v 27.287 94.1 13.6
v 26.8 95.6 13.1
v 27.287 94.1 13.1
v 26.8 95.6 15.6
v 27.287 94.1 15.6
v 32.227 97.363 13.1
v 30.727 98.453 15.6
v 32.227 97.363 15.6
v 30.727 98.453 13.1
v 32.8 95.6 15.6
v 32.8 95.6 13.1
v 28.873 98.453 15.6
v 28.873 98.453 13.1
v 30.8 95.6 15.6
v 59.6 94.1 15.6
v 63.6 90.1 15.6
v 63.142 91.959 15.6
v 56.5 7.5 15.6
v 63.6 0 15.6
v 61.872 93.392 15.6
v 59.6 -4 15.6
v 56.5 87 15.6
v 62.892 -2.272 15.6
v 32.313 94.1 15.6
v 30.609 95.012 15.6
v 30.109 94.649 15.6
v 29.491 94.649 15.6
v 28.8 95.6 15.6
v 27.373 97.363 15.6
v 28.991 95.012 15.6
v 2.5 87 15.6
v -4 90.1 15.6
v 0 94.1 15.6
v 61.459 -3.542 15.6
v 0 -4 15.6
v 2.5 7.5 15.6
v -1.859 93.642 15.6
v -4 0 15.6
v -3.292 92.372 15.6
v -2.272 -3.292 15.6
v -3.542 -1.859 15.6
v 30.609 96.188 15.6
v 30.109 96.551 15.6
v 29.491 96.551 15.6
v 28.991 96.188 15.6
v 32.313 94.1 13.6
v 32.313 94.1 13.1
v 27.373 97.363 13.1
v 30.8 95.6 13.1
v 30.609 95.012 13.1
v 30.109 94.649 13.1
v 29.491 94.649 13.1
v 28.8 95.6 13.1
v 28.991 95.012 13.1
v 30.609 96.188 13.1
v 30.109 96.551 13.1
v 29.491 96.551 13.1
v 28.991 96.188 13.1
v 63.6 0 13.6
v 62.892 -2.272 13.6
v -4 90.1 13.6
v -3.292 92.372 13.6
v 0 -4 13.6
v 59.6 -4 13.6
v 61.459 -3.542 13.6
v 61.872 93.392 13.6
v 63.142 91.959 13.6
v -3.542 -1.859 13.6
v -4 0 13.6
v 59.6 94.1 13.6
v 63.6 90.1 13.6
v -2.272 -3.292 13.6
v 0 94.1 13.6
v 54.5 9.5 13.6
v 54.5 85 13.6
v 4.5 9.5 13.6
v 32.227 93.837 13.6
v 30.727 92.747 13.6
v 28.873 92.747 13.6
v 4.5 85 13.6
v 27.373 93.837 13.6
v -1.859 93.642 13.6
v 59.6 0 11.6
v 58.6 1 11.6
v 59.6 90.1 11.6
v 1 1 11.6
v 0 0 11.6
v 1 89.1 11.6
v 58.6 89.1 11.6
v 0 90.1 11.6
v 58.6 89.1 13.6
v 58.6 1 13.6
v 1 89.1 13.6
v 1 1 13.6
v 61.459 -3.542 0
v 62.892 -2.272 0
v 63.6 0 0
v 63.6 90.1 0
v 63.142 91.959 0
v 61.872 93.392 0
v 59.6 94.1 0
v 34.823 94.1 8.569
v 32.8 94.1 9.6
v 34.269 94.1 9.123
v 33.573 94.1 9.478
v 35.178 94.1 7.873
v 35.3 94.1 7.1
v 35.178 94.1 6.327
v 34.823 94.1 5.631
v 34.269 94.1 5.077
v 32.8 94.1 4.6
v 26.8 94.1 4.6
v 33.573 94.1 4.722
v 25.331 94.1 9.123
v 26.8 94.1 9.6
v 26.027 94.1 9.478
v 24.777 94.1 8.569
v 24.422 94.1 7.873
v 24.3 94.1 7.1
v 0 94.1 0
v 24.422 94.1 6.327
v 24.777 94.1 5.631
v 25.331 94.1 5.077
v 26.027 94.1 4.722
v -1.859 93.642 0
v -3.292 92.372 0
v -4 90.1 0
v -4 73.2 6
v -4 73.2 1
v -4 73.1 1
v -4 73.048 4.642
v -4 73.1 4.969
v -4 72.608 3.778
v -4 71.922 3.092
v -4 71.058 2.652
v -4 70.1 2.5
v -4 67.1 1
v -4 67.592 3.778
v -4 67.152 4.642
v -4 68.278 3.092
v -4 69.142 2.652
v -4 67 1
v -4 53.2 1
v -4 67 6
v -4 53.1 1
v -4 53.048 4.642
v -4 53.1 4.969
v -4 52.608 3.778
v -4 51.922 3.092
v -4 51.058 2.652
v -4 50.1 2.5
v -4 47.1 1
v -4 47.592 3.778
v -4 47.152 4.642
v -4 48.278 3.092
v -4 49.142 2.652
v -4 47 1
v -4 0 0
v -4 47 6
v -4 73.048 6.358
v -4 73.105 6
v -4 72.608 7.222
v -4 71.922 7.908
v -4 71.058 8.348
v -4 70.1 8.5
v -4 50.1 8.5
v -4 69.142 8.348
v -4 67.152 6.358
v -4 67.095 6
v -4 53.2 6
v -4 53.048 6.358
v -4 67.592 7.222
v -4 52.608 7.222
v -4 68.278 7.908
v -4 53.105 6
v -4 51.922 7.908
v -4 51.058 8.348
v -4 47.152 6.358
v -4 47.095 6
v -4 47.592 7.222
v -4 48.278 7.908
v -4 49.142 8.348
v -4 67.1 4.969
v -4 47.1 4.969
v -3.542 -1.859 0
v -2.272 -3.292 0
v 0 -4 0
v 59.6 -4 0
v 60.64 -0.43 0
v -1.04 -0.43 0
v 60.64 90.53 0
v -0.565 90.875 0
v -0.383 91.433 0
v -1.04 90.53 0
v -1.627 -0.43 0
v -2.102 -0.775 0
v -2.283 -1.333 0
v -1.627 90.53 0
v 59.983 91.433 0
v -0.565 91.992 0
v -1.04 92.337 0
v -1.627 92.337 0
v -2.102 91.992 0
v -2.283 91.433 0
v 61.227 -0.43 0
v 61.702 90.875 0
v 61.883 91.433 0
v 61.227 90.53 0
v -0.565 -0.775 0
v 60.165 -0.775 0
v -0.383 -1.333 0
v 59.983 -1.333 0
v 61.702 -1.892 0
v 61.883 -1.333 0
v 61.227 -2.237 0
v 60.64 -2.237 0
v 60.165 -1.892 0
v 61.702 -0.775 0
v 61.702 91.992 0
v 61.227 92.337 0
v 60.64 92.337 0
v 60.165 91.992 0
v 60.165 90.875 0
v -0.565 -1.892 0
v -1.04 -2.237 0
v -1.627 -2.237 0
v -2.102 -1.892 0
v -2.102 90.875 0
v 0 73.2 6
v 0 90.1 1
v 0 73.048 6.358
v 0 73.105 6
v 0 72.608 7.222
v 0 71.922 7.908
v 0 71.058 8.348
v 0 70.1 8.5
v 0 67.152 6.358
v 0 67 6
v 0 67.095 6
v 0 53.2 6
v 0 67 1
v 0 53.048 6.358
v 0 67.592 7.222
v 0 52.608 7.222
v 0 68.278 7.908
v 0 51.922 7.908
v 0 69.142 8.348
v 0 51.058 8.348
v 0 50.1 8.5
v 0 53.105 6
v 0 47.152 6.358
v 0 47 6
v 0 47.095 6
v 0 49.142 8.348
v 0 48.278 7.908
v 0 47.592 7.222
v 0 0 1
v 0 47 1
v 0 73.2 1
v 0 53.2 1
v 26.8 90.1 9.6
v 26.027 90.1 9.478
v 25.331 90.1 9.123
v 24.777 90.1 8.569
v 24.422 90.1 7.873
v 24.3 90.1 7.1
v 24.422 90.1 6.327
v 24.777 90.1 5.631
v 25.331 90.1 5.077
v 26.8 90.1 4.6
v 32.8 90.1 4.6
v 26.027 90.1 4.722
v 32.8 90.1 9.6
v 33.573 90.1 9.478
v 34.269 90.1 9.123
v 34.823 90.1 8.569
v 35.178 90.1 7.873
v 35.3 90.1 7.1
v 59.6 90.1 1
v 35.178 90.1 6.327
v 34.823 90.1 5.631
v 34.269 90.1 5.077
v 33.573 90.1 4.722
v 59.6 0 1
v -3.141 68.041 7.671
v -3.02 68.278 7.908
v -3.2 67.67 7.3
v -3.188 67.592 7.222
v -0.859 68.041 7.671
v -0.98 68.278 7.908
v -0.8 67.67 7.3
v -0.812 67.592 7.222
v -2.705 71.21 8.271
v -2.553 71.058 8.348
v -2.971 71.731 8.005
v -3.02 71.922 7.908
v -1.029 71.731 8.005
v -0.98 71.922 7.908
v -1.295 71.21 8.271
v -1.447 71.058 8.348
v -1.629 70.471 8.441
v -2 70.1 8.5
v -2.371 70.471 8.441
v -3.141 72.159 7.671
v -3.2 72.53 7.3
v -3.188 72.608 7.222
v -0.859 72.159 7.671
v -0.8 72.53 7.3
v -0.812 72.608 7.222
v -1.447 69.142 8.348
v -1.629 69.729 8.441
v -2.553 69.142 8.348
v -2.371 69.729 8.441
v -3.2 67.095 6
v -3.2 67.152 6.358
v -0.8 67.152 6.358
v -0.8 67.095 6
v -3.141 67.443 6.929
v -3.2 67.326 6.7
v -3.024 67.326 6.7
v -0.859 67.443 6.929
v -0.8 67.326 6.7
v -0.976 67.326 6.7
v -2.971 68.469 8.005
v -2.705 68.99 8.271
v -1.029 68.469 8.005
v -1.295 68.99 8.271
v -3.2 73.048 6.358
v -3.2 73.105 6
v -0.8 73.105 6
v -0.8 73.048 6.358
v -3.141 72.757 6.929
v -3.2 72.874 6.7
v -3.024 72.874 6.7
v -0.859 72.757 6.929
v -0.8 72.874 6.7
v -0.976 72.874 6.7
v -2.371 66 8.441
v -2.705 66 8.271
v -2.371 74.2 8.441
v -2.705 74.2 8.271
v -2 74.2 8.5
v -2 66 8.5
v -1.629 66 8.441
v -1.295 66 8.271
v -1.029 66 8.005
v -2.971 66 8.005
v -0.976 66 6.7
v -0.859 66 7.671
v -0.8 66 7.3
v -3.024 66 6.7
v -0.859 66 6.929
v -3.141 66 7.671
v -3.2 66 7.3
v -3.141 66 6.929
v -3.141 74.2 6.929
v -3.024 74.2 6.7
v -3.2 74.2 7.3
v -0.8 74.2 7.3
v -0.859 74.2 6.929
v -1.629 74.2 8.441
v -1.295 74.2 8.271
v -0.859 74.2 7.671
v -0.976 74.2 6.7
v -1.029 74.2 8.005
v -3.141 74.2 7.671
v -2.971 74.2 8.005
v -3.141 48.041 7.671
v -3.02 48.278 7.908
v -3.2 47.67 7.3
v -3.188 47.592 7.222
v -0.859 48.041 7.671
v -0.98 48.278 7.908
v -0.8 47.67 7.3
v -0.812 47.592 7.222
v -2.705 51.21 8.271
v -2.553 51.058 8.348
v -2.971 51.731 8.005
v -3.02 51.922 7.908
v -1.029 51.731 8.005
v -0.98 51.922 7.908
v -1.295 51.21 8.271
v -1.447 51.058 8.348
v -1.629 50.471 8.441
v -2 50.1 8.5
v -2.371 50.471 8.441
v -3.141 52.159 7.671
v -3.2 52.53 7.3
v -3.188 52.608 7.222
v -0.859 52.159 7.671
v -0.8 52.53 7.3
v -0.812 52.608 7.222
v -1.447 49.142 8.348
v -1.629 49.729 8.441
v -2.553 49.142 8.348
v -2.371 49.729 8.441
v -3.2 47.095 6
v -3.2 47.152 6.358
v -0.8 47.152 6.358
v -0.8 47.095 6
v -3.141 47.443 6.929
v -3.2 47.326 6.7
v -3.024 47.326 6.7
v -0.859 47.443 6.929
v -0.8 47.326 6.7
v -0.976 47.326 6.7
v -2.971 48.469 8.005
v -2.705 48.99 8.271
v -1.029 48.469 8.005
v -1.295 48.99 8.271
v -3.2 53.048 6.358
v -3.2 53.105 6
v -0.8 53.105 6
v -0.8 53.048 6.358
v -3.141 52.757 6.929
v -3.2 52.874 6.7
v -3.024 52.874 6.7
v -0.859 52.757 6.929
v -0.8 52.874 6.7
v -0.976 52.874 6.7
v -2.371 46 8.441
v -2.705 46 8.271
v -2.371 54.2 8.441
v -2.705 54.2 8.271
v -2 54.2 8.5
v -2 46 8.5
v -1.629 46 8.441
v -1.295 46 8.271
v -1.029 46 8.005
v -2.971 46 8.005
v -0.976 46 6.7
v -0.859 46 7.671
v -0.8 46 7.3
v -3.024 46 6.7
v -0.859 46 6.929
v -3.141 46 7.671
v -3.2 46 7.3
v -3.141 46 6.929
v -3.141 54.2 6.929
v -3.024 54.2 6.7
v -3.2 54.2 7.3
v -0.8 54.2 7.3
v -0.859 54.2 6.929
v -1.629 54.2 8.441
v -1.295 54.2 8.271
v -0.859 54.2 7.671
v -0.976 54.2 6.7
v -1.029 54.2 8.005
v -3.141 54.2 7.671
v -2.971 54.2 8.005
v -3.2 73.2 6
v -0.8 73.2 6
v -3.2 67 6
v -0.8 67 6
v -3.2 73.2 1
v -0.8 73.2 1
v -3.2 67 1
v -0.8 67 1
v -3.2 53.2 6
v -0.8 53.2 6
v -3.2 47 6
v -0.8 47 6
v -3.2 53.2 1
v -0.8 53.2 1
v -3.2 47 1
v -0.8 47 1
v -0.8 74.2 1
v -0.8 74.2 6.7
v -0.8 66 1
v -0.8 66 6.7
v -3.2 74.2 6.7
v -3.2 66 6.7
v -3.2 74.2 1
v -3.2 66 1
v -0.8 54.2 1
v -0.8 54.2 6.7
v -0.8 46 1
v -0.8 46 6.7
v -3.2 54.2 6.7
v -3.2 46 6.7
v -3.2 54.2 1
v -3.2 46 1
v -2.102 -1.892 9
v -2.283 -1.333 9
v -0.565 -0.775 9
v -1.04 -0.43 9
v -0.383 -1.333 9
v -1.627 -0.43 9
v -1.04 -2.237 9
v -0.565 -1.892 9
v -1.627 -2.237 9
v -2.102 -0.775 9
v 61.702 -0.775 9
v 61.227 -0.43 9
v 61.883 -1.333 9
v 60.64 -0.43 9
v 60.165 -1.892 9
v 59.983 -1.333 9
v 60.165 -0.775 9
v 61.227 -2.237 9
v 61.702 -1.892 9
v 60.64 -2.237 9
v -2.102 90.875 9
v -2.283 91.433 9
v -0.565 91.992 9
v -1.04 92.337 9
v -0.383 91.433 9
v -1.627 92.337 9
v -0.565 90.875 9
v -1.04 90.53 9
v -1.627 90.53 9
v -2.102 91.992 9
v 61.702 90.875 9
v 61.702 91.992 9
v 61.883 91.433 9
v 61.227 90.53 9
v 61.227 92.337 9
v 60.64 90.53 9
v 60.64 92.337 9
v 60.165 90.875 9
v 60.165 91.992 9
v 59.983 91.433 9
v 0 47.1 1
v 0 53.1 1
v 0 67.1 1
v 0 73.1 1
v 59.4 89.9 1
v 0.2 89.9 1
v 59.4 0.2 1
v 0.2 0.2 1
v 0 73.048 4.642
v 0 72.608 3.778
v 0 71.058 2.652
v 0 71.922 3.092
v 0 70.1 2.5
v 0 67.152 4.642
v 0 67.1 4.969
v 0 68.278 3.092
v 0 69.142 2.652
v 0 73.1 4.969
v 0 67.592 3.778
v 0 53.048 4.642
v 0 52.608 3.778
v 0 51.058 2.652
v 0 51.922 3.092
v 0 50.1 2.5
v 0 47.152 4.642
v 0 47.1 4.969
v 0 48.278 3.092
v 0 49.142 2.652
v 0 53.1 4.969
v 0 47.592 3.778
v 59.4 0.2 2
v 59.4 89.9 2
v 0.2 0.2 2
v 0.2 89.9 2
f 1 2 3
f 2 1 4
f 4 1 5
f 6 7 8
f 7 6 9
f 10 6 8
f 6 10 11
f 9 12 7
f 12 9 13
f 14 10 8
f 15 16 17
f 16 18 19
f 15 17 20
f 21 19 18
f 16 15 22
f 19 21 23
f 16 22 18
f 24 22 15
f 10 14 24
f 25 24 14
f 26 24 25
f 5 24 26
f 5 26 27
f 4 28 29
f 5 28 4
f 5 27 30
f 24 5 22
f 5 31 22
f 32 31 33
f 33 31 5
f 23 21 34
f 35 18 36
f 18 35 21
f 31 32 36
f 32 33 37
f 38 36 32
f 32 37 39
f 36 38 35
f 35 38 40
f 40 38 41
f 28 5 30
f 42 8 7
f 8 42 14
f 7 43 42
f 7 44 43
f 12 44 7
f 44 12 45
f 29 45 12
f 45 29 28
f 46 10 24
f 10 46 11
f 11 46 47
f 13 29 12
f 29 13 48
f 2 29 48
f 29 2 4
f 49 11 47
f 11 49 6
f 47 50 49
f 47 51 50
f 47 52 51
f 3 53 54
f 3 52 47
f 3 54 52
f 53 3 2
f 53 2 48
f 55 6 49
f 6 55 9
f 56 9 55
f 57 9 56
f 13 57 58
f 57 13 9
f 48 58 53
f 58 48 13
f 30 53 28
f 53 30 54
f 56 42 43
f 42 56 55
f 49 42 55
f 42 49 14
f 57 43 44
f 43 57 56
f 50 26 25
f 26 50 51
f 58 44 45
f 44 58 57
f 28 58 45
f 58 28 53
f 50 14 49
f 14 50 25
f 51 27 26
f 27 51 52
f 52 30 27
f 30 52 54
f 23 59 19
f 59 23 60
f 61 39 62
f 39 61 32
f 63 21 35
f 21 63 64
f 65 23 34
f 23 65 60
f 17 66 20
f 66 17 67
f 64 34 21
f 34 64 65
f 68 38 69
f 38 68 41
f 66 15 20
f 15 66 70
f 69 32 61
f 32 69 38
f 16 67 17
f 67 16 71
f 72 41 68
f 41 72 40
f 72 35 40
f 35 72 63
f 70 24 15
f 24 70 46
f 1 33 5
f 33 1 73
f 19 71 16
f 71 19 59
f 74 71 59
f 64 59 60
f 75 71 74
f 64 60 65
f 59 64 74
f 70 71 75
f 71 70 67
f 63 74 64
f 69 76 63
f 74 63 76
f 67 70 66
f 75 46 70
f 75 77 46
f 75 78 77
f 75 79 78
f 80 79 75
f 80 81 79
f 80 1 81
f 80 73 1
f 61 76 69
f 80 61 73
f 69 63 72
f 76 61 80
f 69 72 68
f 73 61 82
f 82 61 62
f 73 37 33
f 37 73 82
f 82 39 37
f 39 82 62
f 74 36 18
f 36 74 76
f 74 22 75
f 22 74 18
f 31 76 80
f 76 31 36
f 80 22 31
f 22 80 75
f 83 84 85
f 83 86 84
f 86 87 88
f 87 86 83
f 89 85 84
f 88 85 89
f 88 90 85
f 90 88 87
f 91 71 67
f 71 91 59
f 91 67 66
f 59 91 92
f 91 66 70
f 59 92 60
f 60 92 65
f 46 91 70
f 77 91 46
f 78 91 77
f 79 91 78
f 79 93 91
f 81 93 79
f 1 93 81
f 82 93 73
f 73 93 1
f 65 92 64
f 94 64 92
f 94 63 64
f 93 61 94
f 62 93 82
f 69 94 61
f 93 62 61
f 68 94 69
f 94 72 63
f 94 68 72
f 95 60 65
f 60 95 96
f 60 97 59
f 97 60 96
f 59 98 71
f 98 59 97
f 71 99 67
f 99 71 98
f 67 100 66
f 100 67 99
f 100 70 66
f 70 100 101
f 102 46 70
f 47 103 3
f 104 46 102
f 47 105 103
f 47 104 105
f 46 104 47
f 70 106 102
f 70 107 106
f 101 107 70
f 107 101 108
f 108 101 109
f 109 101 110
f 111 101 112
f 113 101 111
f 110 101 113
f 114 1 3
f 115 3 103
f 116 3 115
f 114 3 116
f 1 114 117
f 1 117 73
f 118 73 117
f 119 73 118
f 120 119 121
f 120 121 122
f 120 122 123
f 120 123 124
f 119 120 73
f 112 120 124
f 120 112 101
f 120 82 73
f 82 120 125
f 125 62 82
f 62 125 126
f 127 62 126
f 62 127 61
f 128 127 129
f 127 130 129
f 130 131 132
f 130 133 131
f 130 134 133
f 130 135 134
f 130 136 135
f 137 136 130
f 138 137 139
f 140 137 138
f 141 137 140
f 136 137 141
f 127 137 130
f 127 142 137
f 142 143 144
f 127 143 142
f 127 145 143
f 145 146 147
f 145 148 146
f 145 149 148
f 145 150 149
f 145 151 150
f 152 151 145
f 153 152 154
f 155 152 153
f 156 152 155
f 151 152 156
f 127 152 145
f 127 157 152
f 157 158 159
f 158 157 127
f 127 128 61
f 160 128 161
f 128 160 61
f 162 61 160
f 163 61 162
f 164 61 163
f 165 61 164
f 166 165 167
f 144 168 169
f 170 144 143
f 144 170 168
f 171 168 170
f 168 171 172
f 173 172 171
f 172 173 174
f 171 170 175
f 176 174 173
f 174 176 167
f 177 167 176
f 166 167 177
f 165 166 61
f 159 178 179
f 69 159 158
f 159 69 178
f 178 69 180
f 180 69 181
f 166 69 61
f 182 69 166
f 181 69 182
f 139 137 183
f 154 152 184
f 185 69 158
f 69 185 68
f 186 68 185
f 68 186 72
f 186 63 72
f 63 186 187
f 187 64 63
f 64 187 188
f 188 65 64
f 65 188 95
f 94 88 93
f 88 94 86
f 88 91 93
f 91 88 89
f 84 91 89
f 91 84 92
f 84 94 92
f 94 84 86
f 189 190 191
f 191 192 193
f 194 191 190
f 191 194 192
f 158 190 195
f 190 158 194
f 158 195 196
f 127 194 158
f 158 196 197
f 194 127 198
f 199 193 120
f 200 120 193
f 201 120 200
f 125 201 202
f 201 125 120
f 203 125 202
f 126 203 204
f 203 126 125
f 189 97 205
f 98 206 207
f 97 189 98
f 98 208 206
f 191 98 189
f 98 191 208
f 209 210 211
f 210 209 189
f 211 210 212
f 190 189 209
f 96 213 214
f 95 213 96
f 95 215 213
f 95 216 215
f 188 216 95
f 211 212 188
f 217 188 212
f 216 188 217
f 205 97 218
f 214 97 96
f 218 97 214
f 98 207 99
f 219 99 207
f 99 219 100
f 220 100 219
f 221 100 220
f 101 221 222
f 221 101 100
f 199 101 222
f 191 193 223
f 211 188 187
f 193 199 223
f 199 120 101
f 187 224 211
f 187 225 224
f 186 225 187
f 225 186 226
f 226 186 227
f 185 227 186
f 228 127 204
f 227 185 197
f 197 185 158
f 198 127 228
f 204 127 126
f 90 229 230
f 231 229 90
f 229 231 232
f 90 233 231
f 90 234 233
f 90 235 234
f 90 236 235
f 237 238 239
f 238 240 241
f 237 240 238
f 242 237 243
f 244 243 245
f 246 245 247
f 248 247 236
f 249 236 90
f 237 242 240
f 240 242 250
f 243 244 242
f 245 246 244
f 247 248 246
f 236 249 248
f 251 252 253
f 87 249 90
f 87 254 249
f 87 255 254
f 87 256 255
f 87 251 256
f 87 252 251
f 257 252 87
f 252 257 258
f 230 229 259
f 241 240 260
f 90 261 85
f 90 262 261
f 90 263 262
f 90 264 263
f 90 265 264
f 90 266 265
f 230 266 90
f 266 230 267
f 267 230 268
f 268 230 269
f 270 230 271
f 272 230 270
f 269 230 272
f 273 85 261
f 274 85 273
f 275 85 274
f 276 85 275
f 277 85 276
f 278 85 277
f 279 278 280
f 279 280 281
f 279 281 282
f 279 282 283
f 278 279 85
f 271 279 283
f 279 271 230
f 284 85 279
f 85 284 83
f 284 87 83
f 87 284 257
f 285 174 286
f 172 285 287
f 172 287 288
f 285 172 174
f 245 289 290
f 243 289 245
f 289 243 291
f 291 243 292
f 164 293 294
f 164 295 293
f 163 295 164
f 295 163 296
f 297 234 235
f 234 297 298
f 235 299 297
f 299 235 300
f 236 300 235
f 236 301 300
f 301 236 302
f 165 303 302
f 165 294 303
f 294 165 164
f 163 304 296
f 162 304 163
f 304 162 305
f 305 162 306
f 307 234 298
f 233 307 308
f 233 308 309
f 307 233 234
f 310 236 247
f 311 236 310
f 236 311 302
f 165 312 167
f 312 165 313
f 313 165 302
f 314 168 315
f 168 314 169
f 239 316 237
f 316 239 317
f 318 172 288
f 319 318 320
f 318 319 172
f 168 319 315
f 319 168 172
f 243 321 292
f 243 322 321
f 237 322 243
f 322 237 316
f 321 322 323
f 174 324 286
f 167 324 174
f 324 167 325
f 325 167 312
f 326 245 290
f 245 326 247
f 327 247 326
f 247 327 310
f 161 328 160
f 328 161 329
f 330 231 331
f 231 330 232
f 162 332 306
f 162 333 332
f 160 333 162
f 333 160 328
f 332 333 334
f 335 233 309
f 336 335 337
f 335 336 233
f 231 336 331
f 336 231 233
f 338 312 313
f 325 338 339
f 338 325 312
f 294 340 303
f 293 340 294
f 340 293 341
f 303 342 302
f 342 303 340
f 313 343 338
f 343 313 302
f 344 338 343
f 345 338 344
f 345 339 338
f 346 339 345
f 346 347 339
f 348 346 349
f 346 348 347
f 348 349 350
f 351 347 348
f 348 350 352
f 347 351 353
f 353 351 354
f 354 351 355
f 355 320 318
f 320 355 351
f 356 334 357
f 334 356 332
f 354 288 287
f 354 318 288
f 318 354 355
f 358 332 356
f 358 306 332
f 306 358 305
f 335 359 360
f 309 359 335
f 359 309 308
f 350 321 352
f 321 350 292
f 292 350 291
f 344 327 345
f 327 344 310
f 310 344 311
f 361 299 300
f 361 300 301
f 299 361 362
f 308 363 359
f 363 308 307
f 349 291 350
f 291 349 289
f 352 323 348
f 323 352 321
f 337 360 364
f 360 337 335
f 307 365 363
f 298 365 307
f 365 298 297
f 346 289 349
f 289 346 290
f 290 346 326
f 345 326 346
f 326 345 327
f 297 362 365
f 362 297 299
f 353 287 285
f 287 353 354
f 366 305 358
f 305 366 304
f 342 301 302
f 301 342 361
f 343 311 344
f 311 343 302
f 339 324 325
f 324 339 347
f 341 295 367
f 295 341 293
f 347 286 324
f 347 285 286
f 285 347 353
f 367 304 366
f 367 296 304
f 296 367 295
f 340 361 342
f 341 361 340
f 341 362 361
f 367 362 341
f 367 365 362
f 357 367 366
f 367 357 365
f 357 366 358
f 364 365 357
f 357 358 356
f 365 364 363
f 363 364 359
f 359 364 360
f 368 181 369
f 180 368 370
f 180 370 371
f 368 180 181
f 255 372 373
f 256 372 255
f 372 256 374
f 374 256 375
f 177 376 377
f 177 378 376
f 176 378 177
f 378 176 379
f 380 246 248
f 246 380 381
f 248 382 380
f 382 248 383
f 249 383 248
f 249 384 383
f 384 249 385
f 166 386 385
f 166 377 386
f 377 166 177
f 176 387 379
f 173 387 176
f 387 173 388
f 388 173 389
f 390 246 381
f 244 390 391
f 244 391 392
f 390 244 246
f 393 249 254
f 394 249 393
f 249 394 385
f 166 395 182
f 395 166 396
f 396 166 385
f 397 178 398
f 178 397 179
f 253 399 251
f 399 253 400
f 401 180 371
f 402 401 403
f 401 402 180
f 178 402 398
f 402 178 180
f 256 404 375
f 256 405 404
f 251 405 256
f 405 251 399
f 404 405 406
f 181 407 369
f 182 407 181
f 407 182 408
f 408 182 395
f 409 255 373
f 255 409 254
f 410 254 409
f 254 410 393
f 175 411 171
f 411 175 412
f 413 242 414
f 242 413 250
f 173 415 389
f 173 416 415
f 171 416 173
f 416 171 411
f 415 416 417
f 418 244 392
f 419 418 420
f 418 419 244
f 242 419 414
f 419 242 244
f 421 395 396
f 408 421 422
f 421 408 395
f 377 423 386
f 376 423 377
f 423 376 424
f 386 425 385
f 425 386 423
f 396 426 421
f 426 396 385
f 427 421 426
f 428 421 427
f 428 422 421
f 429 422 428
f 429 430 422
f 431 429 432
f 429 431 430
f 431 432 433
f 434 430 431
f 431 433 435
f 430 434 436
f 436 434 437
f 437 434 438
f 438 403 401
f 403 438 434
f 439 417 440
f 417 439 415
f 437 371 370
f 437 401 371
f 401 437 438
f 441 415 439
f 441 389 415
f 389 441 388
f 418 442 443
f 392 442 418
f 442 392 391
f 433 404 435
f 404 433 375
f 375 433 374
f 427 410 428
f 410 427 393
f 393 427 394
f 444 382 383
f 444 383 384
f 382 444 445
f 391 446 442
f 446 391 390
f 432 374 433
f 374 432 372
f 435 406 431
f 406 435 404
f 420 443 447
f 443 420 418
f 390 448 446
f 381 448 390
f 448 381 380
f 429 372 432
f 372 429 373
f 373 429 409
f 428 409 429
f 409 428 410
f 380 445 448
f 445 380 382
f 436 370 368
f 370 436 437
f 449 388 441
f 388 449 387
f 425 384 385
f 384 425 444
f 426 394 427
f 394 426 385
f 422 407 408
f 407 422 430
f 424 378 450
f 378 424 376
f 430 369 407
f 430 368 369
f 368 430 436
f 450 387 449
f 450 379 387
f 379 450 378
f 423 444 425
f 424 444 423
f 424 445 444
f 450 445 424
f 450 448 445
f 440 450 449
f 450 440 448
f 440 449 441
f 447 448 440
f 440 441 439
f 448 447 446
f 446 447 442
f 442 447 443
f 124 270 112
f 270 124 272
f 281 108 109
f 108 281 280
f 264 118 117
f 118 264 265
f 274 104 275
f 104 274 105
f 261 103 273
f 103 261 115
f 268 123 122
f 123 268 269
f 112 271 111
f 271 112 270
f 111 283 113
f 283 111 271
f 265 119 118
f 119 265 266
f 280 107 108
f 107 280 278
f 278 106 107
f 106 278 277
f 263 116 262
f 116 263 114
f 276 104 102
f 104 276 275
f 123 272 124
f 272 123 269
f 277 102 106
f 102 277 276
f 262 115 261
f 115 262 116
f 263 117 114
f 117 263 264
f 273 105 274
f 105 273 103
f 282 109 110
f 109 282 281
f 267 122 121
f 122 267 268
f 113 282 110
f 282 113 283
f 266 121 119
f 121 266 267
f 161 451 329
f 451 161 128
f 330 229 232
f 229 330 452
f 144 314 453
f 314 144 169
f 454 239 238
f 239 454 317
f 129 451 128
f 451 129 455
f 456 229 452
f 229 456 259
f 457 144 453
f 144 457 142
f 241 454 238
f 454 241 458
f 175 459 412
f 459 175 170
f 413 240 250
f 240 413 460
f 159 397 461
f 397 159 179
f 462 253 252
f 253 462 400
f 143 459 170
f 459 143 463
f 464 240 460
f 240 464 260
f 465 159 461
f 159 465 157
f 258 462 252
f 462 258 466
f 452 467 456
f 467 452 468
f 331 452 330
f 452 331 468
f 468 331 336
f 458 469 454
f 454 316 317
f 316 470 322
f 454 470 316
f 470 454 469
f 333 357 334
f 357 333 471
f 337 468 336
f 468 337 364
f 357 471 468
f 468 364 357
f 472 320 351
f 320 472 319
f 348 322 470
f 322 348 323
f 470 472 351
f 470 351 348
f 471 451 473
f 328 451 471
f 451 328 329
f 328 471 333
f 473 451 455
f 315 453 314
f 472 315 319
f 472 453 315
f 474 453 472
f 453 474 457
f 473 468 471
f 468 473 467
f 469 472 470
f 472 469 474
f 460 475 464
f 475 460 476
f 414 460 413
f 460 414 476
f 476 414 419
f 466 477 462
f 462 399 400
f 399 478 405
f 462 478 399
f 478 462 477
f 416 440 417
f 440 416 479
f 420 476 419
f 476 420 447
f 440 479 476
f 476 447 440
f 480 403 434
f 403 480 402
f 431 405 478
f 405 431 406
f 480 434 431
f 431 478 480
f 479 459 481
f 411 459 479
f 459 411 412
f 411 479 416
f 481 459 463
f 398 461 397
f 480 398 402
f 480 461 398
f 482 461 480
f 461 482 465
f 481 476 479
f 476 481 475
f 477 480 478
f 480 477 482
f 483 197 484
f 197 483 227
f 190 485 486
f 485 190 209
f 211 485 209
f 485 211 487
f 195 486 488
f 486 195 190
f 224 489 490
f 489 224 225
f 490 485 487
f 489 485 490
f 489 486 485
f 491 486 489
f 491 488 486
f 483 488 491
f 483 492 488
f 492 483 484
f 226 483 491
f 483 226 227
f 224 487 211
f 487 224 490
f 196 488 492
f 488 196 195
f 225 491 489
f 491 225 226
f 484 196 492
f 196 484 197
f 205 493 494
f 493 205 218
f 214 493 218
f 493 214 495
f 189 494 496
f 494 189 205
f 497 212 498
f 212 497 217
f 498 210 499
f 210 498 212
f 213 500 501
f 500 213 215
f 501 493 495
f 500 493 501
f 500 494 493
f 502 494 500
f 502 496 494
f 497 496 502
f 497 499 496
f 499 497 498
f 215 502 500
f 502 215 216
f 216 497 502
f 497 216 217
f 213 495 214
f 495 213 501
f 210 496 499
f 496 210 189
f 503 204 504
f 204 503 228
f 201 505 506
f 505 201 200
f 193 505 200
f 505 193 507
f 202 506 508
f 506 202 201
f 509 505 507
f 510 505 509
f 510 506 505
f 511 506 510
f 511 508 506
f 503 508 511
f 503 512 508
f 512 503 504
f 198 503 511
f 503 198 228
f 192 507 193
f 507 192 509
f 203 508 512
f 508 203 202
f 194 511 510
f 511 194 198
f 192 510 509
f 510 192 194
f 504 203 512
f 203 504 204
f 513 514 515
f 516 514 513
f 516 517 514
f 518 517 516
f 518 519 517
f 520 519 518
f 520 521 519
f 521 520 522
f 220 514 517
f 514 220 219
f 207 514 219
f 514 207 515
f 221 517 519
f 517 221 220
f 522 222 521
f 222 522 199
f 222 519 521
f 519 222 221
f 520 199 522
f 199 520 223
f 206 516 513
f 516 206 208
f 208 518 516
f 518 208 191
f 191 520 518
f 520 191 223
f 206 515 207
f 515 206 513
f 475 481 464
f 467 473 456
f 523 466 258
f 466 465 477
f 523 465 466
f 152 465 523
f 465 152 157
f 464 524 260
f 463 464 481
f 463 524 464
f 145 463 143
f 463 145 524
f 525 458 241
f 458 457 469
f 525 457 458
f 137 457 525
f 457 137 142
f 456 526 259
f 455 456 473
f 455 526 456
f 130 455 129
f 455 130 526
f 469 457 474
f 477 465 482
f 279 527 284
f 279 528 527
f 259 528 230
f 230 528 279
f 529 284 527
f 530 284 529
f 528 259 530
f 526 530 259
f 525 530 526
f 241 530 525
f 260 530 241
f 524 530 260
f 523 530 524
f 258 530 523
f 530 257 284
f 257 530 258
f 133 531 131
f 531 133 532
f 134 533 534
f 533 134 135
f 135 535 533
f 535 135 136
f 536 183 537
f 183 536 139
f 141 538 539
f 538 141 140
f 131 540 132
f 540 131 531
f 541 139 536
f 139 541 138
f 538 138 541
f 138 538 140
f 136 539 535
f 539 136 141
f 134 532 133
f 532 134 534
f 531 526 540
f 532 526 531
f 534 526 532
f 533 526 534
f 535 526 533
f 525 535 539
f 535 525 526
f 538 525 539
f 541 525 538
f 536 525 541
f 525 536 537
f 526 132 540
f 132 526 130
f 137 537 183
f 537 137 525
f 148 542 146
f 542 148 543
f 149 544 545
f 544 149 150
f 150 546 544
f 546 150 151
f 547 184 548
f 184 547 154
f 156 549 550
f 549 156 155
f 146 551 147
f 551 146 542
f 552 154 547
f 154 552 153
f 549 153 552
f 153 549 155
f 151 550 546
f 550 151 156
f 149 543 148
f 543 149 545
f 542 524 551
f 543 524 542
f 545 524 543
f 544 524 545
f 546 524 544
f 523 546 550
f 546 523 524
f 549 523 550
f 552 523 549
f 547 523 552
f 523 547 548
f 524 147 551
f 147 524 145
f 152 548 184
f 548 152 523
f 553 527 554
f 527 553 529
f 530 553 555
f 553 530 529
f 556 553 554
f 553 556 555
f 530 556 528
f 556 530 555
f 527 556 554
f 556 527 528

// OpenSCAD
board_size = [59+0.6, 89.5+0.6];
display_size = [50, 75.5];
board_z = 1.6;

boarder = 4;

//translate([7,board_size[1]-20, 10-3-board_z])
//rotate([0,-90,0])
//button();
//
//translate([7,board_size[1]-40, 10-3-board_z])
//rotate([0,-90,0])
//button();

module button(r = 3, h=boarder+9, hinge_y = 2, hinge_r = 1){
    $fn=20;
    {
    cylinder(h, r, r);

    translate([r-hinge_r,0,h-2-boarder/2])
    rotate([90,0,0])
    cylinder(r*2+hinge_y, hinge_r, hinge_r, center=true);
    
    rotate([0,90,0])
    cylinder(r, r, r);
    }
}

case_with_holes();

module case_with_holes(){
difference(){
case(10);

#translate([7,board_size[1]-20, 10-3-board_z])
rotate([0,-90,0])
button(r=3.1, hinge_r=1.2);

translate([7,board_size[1]-40, 10-3-board_z]){
rotate([0,-90,0])
button(r=3.1, hinge_r=1.2);
}

// typec hole
#translate([board_size[0]/2,board_size[1]+boarder+1.5,10+board_z-4])
hull(){
$fn=20;
rotate([90,0,0]){
translate([-6/2,-0.5,0])
cylinder(20, 5/2, 5/2);

translate([6/2,-0.5,0])
cylinder(20, 5/2, 5/2);
}

}



// Button holes
translate([-boarder,board_size[1]-20-3.1, 0])
cube([boarder, 3.1*2, 6]);

translate([-boarder,board_size[1]-40-3.1, 0])
cube([boarder, 3.1*2, 6]);

#translate([-boarder/2-1.2,board_size[1]-20-3.1-1, 0])
cube([1.2*2, 3.1*2+2, 6.7]);

translate([-boarder/2-1.2,board_size[1]-40-3.1-1, 0])
cube([1.2*2, 3.1*2+2, 6.7]);



#
translate([-boarder/3,-boarder/3,-1])
cylinder(10, 1.9/2, 1.9/2, $fn=10);

#translate([boarder/3+board_size[0],-boarder/3,-1])
cylinder(10, 1.9/2, 1.9/2, $fn=10);

#
translate([-boarder/3,boarder/3+board_size[1],-1])
cylinder(10, 1.9/2, 1.9/2, $fn=10);

#translate([boarder/3+board_size[0],boarder/3+board_size[1],-1])
cylinder(10, 1.9/2, 1.9/2, $fn=10);
}
}

translate([0,0,0])
back_cover();

module back_cover(){


difference(){
    linear_extrude(1)
    offset(boarder)
    square(board_size);
    
    #
    translate([-boarder/3,-boarder/3,-1])
    cylinder(10, 2.2/2, 2.2/2, $fn=10);
    
    #translate([boarder/3+board_size[0],-boarder/3,-1])
    cylinder(10, 2.2/2, 2.2/2, $fn=10);
    
    #
    translate([-boarder/3,boarder/3+board_size[1],-1])
    cylinder(10, 2.2/2, 2.2/2, $fn=10);
    
    #translate([boarder/3+board_size[0],boarder/3+board_size[1],-1])
    cylinder(10, 2.2/2, 2.2/2, $fn=10);
    
    
    
    
}

linear_extrude(2)
offset(-0.2)
square(board_size);

difference(){
    translate([-boarder,board_size[1]-20-3.1+0.1, 0])
    cube([boarder, 3.1*2-0.2, 6]);

    #translate([7,board_size[1]-20, 10-3-board_z+0.2])
    rotate([0,-90,0])
    #button(r=3.1, hinge_r=1.2);
}

difference(){
    translate([-boarder,board_size[1]-40-3.1+0.1, 0])
    cube([boarder, 3.1*2-0.2, 6]);

    #translate([7,board_size[1]-40, 10-3-board_z+0.2])
    rotate([0,-90,0])
    button(r=3.1, hinge_r=1.2);
    
   }

}

module case(thickness = 15){
translate([board_size[0]/2,board_size[1]+boarder+1.5,thickness+3.1])
difference(){
cylinder(2.5, 3, 3);
cylinder(3,   1, 1, $fn = 10);

}
translate([0,0,board_z+2+thickness])
difference(){
    linear_extrude(2)
    offset(boarder)
    square(board_size);


    hull(){
        translate([0,0,2])
        linear_extrude(0.001)
        offset(delta=2)
        translate([9/2,9/2+5,0])
        square(display_size);

        linear_extrude(0.001)
        translate([9/2,9/2+5,0])
        square(display_size);
    }

}


translate([0,0,board_z+thickness])
linear_extrude(2)
difference(){
offset(boarder)
square(board_size);

offset(-1)
square(board_size);
}


linear_extrude(board_z+thickness)
difference(){
offset(boarder)
square(board_size);

square(board_size);

}
}
